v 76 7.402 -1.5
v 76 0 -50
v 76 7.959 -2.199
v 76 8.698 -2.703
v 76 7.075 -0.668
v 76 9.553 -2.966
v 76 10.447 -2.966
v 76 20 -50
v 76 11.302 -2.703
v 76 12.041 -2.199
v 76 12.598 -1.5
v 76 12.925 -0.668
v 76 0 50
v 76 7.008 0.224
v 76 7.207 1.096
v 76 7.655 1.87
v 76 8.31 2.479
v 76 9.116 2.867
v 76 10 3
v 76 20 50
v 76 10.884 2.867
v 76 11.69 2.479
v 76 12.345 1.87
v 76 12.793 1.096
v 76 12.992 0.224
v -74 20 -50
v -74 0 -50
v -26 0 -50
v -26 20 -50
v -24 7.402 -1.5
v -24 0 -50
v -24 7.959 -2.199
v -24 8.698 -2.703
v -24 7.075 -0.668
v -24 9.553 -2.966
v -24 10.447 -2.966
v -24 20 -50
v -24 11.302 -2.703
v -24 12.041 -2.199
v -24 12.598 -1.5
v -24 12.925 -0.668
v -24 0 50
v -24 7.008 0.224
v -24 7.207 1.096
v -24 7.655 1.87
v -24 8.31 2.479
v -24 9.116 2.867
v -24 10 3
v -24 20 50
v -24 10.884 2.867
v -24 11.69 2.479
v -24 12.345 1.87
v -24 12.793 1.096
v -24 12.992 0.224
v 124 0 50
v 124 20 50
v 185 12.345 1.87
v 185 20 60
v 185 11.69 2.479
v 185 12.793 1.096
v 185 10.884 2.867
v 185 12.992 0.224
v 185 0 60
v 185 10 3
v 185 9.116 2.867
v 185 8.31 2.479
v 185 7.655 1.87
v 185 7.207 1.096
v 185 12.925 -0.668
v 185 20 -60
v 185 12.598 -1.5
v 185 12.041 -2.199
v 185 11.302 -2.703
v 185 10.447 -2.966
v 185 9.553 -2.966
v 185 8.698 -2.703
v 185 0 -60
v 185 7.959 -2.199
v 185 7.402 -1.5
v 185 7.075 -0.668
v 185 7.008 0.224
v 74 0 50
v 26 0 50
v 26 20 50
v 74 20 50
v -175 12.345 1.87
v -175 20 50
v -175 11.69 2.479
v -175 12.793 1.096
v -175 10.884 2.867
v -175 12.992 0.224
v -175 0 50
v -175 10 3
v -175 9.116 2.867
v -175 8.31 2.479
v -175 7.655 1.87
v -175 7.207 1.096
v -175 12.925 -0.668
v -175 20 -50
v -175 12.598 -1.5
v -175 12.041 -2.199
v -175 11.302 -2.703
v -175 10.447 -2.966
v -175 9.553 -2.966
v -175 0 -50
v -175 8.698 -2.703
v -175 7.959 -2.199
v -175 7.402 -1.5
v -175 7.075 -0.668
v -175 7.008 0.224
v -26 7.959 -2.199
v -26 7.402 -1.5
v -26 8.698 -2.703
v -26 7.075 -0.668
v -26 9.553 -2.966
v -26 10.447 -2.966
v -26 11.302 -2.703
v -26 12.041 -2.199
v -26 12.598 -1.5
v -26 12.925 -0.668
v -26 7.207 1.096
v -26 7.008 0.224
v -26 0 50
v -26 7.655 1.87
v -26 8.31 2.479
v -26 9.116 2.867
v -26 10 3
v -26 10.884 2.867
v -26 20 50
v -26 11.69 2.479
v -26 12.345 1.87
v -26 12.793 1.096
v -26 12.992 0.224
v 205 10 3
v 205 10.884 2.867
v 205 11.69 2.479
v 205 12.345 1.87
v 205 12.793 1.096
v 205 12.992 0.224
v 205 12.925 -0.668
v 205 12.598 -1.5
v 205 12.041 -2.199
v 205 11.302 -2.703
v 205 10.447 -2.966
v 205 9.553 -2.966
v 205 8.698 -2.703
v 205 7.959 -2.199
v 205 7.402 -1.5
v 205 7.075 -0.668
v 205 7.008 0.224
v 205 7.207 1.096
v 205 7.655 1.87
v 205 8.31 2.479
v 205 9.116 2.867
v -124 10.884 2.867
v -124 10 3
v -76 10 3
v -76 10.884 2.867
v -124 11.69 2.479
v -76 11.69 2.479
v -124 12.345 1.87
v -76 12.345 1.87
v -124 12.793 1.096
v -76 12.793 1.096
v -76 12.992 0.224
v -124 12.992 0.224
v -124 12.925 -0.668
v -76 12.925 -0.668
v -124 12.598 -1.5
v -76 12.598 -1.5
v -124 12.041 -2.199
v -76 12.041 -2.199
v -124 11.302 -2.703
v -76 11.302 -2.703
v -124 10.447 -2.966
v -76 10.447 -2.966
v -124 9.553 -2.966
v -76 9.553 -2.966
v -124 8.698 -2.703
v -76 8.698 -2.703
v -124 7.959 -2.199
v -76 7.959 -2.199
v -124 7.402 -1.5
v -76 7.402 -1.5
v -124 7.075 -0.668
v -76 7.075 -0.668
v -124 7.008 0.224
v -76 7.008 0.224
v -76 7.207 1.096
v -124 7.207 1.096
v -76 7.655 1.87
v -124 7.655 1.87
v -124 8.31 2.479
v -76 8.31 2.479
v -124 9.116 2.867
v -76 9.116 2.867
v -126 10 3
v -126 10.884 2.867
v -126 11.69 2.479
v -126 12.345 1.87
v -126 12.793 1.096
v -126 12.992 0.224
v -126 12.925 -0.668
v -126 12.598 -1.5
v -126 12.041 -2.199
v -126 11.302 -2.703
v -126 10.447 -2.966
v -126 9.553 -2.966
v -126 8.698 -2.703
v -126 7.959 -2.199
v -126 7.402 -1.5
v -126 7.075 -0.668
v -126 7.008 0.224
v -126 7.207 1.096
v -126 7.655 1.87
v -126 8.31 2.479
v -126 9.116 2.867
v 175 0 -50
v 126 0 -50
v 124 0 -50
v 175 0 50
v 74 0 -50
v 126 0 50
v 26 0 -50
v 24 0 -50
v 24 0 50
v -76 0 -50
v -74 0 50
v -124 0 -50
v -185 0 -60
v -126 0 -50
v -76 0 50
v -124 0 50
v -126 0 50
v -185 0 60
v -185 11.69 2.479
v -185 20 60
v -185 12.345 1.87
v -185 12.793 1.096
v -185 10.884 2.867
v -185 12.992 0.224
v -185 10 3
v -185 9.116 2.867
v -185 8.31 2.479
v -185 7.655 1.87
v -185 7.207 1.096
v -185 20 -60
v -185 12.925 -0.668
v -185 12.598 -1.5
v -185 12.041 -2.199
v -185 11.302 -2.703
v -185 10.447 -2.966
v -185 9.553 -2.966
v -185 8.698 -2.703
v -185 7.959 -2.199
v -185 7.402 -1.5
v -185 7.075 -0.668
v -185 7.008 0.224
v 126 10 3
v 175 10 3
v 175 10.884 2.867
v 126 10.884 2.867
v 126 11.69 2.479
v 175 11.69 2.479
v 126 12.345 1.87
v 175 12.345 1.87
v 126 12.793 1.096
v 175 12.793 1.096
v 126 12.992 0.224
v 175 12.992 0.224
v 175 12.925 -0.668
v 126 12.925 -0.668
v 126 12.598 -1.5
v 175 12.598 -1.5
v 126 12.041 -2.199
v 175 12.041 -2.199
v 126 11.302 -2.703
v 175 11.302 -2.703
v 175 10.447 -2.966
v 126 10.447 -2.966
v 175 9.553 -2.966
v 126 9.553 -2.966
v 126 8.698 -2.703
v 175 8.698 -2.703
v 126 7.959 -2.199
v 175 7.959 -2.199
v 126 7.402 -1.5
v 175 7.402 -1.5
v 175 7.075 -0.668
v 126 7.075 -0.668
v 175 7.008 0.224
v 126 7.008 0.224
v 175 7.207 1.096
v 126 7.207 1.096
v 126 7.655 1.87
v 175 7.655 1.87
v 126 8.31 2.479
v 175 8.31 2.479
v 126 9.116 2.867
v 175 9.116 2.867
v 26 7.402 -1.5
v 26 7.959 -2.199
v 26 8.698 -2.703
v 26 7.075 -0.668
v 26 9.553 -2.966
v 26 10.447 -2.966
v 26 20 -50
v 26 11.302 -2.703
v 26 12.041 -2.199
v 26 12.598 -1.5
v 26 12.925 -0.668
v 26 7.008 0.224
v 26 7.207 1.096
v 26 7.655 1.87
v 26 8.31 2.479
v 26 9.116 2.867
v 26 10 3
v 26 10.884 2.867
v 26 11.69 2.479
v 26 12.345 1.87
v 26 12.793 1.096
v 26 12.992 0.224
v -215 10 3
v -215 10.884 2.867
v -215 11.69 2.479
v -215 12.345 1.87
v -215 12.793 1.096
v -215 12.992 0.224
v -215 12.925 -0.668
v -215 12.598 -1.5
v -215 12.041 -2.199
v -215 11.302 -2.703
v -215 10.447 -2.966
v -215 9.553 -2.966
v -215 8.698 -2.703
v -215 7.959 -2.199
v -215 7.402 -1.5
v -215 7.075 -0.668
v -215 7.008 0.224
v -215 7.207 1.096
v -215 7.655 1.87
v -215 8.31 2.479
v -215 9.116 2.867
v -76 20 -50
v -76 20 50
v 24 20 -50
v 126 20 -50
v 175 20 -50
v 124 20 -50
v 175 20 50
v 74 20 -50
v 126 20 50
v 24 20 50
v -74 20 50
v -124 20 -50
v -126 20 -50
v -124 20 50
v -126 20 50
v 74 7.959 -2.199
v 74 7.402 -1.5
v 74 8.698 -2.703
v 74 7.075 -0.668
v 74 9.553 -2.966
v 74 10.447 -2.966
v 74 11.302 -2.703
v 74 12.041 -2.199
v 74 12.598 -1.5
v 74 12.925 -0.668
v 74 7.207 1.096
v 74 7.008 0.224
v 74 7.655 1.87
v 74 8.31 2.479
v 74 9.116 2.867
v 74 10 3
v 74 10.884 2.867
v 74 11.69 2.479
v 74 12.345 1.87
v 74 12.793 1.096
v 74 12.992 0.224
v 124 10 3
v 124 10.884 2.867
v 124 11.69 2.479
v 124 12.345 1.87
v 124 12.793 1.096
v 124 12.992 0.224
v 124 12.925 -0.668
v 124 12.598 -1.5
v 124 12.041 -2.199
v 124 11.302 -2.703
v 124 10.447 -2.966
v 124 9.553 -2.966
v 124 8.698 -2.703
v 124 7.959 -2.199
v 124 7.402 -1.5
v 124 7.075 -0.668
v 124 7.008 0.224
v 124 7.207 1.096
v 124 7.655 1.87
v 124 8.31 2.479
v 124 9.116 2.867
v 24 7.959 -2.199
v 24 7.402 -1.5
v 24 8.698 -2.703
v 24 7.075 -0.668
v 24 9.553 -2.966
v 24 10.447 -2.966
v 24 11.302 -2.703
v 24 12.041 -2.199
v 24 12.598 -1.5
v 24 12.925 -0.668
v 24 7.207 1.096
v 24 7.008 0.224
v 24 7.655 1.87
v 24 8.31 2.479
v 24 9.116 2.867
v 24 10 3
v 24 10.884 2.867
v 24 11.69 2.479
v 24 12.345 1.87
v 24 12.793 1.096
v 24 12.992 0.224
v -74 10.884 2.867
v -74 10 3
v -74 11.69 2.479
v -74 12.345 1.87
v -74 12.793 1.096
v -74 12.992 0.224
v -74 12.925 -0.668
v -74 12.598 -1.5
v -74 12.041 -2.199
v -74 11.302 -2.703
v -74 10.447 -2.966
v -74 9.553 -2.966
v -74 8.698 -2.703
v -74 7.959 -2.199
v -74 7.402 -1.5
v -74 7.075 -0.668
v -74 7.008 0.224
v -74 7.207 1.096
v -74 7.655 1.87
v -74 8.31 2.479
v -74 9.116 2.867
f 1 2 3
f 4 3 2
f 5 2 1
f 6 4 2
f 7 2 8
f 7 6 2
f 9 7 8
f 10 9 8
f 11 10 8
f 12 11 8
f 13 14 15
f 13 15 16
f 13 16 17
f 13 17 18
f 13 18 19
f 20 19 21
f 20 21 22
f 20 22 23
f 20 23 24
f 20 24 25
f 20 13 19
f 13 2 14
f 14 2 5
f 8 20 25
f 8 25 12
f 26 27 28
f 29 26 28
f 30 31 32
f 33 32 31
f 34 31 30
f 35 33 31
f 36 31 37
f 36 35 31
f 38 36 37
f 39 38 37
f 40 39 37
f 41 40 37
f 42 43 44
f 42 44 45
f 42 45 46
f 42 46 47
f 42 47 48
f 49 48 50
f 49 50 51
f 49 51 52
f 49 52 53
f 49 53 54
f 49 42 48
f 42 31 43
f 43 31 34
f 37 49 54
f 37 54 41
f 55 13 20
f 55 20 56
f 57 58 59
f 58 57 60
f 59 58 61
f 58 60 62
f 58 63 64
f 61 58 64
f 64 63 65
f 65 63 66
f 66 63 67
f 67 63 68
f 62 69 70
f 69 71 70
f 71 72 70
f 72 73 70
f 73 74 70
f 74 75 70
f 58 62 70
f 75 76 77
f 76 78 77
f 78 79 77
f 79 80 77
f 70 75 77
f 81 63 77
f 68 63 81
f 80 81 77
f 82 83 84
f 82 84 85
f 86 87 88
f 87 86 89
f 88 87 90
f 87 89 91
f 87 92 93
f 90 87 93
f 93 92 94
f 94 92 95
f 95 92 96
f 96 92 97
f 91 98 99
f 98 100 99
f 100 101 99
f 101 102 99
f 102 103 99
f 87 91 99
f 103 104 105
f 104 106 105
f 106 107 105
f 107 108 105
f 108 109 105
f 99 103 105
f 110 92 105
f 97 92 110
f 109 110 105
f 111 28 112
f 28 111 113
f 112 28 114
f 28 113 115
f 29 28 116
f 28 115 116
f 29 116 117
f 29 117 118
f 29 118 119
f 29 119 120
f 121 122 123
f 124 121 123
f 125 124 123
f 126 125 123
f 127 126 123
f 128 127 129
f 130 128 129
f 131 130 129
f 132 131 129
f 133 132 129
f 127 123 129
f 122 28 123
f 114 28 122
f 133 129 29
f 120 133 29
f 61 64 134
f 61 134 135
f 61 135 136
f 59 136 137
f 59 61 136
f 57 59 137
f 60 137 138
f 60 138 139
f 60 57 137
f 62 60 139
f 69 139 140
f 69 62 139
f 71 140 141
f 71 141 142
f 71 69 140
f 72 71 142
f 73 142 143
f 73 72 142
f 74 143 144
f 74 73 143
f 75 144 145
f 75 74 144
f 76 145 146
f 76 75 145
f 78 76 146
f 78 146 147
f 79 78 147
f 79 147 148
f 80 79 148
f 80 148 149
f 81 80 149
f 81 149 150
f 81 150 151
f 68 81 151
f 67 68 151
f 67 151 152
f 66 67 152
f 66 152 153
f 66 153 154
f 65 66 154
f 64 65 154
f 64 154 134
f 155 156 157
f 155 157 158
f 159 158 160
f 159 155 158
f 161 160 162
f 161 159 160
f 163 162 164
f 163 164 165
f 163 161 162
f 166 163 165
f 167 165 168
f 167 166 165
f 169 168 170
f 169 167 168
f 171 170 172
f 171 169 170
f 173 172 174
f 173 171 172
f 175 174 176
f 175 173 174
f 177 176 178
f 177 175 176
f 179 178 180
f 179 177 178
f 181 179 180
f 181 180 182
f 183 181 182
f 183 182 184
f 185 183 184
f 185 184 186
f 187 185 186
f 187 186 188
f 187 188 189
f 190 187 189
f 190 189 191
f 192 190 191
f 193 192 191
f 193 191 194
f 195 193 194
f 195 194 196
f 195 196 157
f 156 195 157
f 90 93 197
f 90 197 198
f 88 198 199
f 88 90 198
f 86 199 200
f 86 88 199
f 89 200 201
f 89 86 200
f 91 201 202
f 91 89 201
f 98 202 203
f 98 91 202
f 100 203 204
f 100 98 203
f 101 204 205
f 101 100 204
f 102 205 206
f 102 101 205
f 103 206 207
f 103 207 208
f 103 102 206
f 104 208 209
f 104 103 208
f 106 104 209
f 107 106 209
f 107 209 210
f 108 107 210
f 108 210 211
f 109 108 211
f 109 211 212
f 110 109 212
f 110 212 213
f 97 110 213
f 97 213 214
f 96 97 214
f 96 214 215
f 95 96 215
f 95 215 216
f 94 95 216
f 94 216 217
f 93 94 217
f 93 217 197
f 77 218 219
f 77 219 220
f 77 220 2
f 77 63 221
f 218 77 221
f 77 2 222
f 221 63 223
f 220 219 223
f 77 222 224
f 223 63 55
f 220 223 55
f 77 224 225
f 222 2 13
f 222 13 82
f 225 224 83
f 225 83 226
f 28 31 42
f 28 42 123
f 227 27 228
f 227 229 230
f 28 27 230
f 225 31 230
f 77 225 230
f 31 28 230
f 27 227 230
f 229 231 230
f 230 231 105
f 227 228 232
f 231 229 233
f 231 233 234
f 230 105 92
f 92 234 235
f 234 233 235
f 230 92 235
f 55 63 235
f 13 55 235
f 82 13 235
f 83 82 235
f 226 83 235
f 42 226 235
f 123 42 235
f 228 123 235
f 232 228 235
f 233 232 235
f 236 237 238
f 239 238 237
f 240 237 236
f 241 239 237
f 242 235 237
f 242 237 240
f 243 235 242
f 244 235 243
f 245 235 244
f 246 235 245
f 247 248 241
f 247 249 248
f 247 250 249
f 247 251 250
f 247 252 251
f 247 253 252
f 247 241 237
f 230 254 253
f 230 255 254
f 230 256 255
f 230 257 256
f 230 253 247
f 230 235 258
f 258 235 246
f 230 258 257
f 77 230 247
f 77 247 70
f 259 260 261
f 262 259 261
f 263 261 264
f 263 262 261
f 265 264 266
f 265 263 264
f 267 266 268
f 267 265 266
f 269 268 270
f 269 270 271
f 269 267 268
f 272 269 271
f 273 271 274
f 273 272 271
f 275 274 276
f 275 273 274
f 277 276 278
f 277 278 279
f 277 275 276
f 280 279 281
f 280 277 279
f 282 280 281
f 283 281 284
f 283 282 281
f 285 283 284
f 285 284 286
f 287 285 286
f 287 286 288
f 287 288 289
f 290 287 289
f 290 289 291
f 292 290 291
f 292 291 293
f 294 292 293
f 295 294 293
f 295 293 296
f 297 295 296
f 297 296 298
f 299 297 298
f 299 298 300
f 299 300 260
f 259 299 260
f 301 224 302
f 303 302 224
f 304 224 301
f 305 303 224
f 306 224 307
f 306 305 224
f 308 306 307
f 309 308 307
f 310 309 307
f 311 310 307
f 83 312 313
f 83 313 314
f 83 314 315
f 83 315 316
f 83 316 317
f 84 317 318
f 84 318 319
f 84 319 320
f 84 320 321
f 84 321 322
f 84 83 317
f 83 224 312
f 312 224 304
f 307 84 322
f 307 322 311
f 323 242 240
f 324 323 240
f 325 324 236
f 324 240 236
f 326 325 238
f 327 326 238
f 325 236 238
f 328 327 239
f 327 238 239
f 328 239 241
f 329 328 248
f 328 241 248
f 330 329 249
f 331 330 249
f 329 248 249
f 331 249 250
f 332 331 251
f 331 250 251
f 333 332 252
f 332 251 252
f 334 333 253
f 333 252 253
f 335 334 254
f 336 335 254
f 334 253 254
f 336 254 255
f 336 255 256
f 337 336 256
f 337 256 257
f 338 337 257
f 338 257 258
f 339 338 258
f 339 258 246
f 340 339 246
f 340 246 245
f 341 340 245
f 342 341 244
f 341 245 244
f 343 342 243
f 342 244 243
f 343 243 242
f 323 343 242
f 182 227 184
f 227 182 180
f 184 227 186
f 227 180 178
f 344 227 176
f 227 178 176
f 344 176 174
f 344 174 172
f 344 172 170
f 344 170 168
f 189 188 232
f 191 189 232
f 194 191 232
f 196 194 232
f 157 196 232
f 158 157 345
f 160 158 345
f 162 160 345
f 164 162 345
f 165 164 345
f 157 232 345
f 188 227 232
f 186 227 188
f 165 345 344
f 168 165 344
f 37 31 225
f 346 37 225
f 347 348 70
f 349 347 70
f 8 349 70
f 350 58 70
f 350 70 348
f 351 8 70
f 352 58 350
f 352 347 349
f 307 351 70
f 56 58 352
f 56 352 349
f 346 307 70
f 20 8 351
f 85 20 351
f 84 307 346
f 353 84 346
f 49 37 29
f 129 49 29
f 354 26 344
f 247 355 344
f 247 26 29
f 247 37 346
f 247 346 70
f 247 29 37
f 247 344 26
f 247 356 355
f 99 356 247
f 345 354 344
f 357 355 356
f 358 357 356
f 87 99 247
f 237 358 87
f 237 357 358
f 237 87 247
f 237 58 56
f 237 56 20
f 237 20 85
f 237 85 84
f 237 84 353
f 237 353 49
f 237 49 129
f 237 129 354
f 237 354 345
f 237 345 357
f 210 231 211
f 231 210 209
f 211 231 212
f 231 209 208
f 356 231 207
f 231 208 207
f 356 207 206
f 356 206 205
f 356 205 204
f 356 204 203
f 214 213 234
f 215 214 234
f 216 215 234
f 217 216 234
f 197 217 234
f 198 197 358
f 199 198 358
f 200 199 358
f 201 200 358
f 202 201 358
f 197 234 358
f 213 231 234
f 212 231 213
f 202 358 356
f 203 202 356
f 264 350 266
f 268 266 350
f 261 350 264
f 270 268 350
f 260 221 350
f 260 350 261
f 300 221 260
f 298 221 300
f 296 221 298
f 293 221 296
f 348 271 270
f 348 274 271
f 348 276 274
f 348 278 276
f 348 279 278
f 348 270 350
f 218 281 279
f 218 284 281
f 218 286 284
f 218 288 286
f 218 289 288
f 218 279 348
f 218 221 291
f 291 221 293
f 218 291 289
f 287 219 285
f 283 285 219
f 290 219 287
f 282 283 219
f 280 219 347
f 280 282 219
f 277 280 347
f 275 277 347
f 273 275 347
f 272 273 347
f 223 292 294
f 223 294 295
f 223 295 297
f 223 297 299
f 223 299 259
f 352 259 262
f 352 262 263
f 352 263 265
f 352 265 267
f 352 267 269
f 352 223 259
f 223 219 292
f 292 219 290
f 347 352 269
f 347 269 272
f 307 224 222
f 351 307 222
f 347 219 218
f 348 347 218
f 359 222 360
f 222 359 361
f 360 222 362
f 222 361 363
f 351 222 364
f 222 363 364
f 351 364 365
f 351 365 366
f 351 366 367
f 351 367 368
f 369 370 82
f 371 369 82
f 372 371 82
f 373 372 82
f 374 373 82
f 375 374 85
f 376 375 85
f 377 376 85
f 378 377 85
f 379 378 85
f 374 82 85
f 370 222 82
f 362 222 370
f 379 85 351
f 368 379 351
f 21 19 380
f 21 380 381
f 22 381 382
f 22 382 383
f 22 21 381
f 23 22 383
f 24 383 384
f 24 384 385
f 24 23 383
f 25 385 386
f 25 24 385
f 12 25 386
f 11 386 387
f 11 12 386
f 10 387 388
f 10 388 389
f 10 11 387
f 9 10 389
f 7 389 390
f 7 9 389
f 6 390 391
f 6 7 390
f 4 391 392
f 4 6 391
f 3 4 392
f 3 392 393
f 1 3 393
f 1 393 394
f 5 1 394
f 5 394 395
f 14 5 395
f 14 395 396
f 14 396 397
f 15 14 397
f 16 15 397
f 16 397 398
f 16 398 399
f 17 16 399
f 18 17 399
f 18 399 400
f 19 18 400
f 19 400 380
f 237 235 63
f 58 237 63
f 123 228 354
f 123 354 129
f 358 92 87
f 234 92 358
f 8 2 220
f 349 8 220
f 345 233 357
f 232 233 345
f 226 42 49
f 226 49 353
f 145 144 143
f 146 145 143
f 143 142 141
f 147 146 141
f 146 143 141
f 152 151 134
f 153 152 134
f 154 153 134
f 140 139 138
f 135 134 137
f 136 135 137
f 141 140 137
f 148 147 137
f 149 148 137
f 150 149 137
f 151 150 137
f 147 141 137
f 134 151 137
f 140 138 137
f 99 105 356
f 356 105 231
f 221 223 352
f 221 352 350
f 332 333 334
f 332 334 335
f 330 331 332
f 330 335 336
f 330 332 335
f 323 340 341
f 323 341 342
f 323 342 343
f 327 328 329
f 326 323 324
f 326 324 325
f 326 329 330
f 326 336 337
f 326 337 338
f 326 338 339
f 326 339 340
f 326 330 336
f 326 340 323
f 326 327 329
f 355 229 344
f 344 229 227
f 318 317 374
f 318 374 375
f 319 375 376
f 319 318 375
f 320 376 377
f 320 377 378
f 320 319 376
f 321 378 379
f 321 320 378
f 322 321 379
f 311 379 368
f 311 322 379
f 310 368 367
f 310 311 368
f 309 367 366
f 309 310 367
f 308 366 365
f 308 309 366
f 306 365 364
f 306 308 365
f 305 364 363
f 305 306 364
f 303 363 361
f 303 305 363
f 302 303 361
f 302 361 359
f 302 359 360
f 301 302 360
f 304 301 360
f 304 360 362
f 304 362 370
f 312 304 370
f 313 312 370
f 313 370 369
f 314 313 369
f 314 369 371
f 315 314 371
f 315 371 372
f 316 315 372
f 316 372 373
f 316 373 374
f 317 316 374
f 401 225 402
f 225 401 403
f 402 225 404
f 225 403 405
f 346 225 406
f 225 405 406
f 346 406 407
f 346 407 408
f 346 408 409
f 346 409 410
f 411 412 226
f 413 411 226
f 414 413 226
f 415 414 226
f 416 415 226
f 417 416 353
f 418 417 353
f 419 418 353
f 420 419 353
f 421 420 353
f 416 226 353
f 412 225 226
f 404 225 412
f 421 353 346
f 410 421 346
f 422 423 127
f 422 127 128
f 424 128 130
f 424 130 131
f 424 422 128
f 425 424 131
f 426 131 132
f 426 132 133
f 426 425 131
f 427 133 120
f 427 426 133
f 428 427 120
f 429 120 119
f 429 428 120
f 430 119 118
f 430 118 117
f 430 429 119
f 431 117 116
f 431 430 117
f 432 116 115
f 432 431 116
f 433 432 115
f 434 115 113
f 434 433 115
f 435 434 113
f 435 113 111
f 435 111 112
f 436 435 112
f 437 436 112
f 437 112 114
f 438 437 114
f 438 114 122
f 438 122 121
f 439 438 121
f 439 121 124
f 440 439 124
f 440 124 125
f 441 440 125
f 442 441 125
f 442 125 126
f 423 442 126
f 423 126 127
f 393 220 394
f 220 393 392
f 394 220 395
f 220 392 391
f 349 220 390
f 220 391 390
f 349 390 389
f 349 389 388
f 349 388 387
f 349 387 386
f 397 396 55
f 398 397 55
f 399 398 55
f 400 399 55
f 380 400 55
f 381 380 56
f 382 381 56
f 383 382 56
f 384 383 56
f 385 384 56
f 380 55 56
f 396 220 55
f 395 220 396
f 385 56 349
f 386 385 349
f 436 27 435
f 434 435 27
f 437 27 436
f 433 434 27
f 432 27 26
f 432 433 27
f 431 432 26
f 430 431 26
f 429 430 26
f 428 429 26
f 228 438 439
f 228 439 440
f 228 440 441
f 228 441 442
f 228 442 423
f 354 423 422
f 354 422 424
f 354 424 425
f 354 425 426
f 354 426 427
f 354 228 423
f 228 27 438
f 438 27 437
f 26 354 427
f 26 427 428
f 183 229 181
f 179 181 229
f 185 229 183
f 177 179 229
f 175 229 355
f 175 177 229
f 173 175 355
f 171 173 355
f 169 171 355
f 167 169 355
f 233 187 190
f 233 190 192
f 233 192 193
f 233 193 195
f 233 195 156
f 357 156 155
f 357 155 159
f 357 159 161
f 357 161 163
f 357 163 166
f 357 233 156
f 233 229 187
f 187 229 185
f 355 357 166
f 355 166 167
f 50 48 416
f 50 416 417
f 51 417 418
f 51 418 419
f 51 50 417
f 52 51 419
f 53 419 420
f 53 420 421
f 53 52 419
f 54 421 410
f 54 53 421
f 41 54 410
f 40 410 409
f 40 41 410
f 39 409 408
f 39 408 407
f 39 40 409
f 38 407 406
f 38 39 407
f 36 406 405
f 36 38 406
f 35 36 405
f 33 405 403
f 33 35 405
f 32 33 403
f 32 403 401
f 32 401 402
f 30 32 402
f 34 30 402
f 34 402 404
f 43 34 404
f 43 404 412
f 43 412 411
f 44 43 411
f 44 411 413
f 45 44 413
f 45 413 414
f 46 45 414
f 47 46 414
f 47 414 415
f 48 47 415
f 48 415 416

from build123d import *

# Parameters (mm, degrees)
SKETCH1_W                = 370
SKETCH1_H                = 120
SKETCH1_W_2              = 350
SKETCH1_H_2              = 100
BOSS_EXTRUDE1_DEPTH      = 20
SKETCH2_R                = 3
BOSS_EXTRUDE2_DEPTH      = 30
BOSS_EXTRUDE2_DEPTH_BACK = 390
SKETCH4_W                = 2
SKETCH4_H                = 20
BOSS_EXTRUDE3_DEPTH      = 100


with BuildPart() as part:
    # Sketch1 → Boss-Extrude1 (new body)
    with BuildSketch(Plane(origin=(0, 0, 0), x_dir=(1, 0, 0), z_dir=(0, 1, 0))):
        Rectangle(SKETCH1_W, SKETCH1_H)
        Rectangle(SKETCH1_W_2, SKETCH1_H_2, mode=Mode.SUBTRACT)
    extrude(amount=BOSS_EXTRUDE1_DEPTH)

    # Sketch2 → Boss-Extrude2 (add, two sides)
    with BuildSketch(Plane.ZY.offset(185)) as boss_extrude2_sk:
        with Locations((0, 10)):
            Circle(SKETCH2_R)
    extrude(amount=BOSS_EXTRUDE2_DEPTH)
    extrude(boss_extrude2_sk.sketch, amount=-BOSS_EXTRUDE2_DEPTH_BACK)

    # Sketch4 → Boss-Extrude3 (add)
    with BuildSketch(Plane(origin=(0, 0, 50), x_dir=(-1, 0, 0), z_dir=(0, 0, -1))):
        with Locations((-125, 10)):
            Rectangle(SKETCH4_W, SKETCH4_H)
        with Locations((-75, 10)):
            Rectangle(SKETCH4_W, SKETCH4_H)
        with Locations((-25, 10)):
            Rectangle(SKETCH4_W, SKETCH4_H)
        with Locations((25, 10)):
            Rectangle(SKETCH4_W, SKETCH4_H)
        with Locations((75, 10)):
            Rectangle(SKETCH4_W, SKETCH4_H)
        with Locations((125, 10)):
            Rectangle(SKETCH4_W, SKETCH4_H)
    extrude(amount=BOSS_EXTRUDE3_DEPTH)


solid = part.part
